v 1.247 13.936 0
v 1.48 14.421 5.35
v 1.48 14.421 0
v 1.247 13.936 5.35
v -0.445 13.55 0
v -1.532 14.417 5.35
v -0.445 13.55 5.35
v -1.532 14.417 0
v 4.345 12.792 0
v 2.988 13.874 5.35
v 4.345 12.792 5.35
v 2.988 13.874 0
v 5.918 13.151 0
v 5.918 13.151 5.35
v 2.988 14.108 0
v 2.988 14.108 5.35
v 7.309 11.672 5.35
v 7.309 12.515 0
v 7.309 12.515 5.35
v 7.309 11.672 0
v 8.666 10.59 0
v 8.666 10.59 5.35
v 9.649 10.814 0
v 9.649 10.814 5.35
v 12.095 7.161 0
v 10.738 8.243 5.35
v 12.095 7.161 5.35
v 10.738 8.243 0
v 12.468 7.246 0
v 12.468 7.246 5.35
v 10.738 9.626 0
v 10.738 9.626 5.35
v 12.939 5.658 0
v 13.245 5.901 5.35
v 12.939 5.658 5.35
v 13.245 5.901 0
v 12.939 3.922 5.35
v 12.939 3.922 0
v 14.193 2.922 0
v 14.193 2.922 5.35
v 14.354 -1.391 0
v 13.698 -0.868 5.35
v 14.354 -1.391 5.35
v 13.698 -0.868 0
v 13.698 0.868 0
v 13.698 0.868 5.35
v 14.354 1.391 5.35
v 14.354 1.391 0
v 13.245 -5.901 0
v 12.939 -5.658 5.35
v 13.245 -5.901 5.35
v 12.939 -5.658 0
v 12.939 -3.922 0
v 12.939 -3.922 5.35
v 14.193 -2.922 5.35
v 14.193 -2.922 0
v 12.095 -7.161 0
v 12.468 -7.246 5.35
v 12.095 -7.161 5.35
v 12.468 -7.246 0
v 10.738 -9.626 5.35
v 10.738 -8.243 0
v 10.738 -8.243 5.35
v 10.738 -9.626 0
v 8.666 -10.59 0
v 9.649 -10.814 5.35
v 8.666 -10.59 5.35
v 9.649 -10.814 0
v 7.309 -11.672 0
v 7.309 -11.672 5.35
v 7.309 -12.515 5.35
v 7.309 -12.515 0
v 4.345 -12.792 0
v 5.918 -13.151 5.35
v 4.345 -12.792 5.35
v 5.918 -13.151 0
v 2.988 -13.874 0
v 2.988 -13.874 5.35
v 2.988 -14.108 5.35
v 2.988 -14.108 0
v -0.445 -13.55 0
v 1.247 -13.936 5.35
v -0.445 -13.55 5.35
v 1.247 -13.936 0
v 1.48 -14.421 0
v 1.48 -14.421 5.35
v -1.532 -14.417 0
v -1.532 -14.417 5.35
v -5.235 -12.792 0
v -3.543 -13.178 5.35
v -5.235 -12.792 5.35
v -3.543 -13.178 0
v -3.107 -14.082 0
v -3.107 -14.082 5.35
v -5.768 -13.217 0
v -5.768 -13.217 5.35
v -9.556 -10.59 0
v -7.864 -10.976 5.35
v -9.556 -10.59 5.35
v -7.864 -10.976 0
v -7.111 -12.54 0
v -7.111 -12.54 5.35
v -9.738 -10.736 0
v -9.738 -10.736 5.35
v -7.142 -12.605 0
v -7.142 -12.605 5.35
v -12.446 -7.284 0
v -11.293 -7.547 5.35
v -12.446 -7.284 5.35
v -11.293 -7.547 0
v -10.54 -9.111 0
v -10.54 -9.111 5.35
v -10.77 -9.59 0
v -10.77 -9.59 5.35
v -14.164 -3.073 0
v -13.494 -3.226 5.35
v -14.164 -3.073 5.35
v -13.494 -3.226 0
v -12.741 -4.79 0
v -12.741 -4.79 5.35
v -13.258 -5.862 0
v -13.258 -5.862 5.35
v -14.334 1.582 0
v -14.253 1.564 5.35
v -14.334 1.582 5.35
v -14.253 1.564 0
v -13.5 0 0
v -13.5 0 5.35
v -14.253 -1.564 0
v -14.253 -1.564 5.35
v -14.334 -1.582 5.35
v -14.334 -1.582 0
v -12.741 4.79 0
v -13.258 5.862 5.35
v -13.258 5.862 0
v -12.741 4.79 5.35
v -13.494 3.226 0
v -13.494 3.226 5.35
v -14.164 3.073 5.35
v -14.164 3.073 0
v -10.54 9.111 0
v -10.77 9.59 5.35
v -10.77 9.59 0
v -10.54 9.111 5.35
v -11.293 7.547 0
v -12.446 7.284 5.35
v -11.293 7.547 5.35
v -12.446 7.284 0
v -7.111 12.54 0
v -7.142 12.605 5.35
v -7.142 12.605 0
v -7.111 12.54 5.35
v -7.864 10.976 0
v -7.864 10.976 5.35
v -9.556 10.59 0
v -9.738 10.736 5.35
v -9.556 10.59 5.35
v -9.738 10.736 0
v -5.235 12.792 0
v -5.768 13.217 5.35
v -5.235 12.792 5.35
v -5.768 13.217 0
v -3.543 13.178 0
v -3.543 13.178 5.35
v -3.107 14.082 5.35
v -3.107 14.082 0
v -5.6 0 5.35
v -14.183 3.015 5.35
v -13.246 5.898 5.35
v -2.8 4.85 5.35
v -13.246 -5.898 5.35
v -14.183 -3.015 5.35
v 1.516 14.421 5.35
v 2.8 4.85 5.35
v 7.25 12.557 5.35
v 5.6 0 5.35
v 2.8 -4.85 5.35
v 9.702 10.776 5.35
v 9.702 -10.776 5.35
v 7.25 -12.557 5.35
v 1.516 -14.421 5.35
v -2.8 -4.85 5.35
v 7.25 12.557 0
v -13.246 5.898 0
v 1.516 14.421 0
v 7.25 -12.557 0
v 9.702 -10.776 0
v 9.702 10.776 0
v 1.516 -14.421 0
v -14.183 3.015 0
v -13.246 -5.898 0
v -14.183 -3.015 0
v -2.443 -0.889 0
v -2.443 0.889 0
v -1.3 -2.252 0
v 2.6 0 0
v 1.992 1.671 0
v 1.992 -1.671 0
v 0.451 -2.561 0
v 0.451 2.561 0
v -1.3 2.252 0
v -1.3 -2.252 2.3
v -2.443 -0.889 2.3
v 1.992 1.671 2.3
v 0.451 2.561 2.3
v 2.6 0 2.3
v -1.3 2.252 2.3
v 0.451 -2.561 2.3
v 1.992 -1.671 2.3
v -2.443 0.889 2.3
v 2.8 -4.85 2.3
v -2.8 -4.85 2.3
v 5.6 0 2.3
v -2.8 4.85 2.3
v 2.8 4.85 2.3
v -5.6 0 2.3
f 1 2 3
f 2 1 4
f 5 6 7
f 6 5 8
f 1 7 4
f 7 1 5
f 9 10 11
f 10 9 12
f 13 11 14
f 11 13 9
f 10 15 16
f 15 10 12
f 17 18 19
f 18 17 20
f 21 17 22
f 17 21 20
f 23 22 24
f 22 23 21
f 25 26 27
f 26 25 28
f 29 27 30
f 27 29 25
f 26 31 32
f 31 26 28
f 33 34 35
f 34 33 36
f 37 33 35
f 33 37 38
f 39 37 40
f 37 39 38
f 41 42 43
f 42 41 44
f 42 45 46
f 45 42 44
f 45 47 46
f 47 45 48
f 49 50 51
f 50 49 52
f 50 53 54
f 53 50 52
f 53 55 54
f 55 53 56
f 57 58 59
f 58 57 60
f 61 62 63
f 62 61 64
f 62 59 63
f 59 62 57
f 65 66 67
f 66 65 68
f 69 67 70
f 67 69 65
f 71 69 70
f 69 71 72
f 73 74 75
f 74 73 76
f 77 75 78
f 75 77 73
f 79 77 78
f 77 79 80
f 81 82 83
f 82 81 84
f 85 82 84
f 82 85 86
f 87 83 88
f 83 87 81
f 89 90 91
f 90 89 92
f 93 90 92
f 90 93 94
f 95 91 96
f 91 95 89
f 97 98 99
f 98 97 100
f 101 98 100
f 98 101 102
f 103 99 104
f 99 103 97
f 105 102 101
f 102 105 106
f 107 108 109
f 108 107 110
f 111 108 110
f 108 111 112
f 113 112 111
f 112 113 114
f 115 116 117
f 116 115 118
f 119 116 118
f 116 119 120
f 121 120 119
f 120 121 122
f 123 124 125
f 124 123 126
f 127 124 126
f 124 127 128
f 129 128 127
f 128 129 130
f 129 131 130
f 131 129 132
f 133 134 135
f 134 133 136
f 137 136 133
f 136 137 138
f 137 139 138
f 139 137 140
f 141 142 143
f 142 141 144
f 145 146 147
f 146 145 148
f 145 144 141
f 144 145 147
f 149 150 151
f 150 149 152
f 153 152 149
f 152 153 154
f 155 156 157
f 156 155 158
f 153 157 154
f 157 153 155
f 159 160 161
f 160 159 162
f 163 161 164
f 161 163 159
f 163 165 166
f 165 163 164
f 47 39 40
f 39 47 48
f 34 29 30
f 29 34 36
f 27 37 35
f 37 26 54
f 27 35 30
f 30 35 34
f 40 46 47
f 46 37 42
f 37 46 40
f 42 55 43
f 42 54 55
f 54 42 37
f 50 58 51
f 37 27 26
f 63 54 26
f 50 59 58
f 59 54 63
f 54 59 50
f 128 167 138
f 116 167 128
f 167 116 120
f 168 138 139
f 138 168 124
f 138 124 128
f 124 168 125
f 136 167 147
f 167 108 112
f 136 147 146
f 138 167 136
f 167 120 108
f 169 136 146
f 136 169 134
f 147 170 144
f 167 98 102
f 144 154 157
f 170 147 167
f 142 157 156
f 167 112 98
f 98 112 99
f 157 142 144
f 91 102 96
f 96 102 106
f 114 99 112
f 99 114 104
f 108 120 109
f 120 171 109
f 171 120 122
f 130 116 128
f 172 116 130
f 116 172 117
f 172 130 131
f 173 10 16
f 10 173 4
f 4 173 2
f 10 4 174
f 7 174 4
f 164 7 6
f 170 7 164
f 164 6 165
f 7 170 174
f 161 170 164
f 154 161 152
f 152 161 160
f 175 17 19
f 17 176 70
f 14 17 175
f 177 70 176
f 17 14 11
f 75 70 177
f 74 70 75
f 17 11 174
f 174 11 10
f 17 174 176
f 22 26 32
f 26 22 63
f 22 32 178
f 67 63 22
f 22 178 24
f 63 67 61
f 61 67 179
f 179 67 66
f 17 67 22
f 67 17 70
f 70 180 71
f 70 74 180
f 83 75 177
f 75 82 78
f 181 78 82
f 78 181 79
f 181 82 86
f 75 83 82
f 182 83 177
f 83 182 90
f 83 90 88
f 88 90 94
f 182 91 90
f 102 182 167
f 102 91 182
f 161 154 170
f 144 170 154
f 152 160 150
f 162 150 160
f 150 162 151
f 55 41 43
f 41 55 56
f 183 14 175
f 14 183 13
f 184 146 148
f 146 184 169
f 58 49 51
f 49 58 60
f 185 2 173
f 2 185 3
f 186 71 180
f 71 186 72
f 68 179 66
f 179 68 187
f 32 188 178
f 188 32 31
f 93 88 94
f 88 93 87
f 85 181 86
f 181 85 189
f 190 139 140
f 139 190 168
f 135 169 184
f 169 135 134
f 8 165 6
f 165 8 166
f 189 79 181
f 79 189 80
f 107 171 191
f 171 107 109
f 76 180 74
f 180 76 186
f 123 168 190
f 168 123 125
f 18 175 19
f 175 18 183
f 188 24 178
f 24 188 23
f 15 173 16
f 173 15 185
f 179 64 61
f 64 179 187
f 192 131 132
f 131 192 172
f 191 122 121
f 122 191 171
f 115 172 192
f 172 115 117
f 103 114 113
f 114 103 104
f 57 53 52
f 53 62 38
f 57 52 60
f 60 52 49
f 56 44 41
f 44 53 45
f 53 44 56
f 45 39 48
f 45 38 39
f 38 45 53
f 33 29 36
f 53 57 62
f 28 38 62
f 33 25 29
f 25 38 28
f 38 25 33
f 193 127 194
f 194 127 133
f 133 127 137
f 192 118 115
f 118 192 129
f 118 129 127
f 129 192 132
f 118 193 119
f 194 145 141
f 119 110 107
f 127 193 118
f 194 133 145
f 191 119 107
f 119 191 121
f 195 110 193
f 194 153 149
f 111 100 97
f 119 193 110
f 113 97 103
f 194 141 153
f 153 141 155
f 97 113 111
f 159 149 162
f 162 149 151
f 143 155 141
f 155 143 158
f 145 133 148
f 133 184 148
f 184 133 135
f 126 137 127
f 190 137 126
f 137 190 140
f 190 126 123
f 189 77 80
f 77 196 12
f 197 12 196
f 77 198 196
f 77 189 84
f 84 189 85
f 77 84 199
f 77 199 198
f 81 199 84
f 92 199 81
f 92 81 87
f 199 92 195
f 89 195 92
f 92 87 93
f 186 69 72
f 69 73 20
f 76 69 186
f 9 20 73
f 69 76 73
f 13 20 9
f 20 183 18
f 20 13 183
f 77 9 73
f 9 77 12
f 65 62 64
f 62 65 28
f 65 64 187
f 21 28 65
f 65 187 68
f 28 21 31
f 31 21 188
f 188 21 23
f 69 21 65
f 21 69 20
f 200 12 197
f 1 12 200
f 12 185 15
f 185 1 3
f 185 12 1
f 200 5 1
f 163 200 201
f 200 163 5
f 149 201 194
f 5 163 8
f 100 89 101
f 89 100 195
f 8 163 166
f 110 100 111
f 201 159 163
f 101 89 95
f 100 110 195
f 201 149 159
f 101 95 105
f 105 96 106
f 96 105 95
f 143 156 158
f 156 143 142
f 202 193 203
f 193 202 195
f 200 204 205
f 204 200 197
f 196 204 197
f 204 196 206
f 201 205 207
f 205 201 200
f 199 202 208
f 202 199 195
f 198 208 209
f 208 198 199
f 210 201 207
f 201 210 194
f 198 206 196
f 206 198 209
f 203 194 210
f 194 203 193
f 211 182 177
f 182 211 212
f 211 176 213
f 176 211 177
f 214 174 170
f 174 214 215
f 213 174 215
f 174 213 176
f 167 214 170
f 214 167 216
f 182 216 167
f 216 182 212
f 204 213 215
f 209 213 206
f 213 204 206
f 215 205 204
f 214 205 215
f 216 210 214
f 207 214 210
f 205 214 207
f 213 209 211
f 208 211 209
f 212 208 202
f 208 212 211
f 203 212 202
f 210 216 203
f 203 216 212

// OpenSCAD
/*

Parametric knob generator
by Gian Pablo Villamil
May 2011

Makes knurled knobs that accomodate a nut in the middle, useful for things
like camera mounts.

*/

knob_radius = 14.5;
dent_radius = 2;
knob_height = 5.35;
num_dents = 20;
dent_offset = 1;

nut_hole_radius = 2.6; // half of 1/4 inch in millimeters
nut_size_radius =5.6; // point to point size of nut

module knob()
{
	translate([0, 0, 0]) {
		difference() {
		cylinder(h = knob_height, r = knob_radius);
		for (i = [0:(num_dents - 1)]) {
			translate([sin(360*i/num_dents)*(knob_radius+dent_offset), cos(360*i/num_dents)*(knob_radius+dent_offset), -5 ])
			cylinder(h = knob_height+10, r=dent_radius);
			}
		translate([0,0,-5]) cylinder(h = knob_height+10, r=nut_hole_radius,$fa=10);
		translate([0,0,2.3]) cylinder(h = knob_height+10, r=nut_size_radius,$fa=60);
		}
	}
}

knob();
